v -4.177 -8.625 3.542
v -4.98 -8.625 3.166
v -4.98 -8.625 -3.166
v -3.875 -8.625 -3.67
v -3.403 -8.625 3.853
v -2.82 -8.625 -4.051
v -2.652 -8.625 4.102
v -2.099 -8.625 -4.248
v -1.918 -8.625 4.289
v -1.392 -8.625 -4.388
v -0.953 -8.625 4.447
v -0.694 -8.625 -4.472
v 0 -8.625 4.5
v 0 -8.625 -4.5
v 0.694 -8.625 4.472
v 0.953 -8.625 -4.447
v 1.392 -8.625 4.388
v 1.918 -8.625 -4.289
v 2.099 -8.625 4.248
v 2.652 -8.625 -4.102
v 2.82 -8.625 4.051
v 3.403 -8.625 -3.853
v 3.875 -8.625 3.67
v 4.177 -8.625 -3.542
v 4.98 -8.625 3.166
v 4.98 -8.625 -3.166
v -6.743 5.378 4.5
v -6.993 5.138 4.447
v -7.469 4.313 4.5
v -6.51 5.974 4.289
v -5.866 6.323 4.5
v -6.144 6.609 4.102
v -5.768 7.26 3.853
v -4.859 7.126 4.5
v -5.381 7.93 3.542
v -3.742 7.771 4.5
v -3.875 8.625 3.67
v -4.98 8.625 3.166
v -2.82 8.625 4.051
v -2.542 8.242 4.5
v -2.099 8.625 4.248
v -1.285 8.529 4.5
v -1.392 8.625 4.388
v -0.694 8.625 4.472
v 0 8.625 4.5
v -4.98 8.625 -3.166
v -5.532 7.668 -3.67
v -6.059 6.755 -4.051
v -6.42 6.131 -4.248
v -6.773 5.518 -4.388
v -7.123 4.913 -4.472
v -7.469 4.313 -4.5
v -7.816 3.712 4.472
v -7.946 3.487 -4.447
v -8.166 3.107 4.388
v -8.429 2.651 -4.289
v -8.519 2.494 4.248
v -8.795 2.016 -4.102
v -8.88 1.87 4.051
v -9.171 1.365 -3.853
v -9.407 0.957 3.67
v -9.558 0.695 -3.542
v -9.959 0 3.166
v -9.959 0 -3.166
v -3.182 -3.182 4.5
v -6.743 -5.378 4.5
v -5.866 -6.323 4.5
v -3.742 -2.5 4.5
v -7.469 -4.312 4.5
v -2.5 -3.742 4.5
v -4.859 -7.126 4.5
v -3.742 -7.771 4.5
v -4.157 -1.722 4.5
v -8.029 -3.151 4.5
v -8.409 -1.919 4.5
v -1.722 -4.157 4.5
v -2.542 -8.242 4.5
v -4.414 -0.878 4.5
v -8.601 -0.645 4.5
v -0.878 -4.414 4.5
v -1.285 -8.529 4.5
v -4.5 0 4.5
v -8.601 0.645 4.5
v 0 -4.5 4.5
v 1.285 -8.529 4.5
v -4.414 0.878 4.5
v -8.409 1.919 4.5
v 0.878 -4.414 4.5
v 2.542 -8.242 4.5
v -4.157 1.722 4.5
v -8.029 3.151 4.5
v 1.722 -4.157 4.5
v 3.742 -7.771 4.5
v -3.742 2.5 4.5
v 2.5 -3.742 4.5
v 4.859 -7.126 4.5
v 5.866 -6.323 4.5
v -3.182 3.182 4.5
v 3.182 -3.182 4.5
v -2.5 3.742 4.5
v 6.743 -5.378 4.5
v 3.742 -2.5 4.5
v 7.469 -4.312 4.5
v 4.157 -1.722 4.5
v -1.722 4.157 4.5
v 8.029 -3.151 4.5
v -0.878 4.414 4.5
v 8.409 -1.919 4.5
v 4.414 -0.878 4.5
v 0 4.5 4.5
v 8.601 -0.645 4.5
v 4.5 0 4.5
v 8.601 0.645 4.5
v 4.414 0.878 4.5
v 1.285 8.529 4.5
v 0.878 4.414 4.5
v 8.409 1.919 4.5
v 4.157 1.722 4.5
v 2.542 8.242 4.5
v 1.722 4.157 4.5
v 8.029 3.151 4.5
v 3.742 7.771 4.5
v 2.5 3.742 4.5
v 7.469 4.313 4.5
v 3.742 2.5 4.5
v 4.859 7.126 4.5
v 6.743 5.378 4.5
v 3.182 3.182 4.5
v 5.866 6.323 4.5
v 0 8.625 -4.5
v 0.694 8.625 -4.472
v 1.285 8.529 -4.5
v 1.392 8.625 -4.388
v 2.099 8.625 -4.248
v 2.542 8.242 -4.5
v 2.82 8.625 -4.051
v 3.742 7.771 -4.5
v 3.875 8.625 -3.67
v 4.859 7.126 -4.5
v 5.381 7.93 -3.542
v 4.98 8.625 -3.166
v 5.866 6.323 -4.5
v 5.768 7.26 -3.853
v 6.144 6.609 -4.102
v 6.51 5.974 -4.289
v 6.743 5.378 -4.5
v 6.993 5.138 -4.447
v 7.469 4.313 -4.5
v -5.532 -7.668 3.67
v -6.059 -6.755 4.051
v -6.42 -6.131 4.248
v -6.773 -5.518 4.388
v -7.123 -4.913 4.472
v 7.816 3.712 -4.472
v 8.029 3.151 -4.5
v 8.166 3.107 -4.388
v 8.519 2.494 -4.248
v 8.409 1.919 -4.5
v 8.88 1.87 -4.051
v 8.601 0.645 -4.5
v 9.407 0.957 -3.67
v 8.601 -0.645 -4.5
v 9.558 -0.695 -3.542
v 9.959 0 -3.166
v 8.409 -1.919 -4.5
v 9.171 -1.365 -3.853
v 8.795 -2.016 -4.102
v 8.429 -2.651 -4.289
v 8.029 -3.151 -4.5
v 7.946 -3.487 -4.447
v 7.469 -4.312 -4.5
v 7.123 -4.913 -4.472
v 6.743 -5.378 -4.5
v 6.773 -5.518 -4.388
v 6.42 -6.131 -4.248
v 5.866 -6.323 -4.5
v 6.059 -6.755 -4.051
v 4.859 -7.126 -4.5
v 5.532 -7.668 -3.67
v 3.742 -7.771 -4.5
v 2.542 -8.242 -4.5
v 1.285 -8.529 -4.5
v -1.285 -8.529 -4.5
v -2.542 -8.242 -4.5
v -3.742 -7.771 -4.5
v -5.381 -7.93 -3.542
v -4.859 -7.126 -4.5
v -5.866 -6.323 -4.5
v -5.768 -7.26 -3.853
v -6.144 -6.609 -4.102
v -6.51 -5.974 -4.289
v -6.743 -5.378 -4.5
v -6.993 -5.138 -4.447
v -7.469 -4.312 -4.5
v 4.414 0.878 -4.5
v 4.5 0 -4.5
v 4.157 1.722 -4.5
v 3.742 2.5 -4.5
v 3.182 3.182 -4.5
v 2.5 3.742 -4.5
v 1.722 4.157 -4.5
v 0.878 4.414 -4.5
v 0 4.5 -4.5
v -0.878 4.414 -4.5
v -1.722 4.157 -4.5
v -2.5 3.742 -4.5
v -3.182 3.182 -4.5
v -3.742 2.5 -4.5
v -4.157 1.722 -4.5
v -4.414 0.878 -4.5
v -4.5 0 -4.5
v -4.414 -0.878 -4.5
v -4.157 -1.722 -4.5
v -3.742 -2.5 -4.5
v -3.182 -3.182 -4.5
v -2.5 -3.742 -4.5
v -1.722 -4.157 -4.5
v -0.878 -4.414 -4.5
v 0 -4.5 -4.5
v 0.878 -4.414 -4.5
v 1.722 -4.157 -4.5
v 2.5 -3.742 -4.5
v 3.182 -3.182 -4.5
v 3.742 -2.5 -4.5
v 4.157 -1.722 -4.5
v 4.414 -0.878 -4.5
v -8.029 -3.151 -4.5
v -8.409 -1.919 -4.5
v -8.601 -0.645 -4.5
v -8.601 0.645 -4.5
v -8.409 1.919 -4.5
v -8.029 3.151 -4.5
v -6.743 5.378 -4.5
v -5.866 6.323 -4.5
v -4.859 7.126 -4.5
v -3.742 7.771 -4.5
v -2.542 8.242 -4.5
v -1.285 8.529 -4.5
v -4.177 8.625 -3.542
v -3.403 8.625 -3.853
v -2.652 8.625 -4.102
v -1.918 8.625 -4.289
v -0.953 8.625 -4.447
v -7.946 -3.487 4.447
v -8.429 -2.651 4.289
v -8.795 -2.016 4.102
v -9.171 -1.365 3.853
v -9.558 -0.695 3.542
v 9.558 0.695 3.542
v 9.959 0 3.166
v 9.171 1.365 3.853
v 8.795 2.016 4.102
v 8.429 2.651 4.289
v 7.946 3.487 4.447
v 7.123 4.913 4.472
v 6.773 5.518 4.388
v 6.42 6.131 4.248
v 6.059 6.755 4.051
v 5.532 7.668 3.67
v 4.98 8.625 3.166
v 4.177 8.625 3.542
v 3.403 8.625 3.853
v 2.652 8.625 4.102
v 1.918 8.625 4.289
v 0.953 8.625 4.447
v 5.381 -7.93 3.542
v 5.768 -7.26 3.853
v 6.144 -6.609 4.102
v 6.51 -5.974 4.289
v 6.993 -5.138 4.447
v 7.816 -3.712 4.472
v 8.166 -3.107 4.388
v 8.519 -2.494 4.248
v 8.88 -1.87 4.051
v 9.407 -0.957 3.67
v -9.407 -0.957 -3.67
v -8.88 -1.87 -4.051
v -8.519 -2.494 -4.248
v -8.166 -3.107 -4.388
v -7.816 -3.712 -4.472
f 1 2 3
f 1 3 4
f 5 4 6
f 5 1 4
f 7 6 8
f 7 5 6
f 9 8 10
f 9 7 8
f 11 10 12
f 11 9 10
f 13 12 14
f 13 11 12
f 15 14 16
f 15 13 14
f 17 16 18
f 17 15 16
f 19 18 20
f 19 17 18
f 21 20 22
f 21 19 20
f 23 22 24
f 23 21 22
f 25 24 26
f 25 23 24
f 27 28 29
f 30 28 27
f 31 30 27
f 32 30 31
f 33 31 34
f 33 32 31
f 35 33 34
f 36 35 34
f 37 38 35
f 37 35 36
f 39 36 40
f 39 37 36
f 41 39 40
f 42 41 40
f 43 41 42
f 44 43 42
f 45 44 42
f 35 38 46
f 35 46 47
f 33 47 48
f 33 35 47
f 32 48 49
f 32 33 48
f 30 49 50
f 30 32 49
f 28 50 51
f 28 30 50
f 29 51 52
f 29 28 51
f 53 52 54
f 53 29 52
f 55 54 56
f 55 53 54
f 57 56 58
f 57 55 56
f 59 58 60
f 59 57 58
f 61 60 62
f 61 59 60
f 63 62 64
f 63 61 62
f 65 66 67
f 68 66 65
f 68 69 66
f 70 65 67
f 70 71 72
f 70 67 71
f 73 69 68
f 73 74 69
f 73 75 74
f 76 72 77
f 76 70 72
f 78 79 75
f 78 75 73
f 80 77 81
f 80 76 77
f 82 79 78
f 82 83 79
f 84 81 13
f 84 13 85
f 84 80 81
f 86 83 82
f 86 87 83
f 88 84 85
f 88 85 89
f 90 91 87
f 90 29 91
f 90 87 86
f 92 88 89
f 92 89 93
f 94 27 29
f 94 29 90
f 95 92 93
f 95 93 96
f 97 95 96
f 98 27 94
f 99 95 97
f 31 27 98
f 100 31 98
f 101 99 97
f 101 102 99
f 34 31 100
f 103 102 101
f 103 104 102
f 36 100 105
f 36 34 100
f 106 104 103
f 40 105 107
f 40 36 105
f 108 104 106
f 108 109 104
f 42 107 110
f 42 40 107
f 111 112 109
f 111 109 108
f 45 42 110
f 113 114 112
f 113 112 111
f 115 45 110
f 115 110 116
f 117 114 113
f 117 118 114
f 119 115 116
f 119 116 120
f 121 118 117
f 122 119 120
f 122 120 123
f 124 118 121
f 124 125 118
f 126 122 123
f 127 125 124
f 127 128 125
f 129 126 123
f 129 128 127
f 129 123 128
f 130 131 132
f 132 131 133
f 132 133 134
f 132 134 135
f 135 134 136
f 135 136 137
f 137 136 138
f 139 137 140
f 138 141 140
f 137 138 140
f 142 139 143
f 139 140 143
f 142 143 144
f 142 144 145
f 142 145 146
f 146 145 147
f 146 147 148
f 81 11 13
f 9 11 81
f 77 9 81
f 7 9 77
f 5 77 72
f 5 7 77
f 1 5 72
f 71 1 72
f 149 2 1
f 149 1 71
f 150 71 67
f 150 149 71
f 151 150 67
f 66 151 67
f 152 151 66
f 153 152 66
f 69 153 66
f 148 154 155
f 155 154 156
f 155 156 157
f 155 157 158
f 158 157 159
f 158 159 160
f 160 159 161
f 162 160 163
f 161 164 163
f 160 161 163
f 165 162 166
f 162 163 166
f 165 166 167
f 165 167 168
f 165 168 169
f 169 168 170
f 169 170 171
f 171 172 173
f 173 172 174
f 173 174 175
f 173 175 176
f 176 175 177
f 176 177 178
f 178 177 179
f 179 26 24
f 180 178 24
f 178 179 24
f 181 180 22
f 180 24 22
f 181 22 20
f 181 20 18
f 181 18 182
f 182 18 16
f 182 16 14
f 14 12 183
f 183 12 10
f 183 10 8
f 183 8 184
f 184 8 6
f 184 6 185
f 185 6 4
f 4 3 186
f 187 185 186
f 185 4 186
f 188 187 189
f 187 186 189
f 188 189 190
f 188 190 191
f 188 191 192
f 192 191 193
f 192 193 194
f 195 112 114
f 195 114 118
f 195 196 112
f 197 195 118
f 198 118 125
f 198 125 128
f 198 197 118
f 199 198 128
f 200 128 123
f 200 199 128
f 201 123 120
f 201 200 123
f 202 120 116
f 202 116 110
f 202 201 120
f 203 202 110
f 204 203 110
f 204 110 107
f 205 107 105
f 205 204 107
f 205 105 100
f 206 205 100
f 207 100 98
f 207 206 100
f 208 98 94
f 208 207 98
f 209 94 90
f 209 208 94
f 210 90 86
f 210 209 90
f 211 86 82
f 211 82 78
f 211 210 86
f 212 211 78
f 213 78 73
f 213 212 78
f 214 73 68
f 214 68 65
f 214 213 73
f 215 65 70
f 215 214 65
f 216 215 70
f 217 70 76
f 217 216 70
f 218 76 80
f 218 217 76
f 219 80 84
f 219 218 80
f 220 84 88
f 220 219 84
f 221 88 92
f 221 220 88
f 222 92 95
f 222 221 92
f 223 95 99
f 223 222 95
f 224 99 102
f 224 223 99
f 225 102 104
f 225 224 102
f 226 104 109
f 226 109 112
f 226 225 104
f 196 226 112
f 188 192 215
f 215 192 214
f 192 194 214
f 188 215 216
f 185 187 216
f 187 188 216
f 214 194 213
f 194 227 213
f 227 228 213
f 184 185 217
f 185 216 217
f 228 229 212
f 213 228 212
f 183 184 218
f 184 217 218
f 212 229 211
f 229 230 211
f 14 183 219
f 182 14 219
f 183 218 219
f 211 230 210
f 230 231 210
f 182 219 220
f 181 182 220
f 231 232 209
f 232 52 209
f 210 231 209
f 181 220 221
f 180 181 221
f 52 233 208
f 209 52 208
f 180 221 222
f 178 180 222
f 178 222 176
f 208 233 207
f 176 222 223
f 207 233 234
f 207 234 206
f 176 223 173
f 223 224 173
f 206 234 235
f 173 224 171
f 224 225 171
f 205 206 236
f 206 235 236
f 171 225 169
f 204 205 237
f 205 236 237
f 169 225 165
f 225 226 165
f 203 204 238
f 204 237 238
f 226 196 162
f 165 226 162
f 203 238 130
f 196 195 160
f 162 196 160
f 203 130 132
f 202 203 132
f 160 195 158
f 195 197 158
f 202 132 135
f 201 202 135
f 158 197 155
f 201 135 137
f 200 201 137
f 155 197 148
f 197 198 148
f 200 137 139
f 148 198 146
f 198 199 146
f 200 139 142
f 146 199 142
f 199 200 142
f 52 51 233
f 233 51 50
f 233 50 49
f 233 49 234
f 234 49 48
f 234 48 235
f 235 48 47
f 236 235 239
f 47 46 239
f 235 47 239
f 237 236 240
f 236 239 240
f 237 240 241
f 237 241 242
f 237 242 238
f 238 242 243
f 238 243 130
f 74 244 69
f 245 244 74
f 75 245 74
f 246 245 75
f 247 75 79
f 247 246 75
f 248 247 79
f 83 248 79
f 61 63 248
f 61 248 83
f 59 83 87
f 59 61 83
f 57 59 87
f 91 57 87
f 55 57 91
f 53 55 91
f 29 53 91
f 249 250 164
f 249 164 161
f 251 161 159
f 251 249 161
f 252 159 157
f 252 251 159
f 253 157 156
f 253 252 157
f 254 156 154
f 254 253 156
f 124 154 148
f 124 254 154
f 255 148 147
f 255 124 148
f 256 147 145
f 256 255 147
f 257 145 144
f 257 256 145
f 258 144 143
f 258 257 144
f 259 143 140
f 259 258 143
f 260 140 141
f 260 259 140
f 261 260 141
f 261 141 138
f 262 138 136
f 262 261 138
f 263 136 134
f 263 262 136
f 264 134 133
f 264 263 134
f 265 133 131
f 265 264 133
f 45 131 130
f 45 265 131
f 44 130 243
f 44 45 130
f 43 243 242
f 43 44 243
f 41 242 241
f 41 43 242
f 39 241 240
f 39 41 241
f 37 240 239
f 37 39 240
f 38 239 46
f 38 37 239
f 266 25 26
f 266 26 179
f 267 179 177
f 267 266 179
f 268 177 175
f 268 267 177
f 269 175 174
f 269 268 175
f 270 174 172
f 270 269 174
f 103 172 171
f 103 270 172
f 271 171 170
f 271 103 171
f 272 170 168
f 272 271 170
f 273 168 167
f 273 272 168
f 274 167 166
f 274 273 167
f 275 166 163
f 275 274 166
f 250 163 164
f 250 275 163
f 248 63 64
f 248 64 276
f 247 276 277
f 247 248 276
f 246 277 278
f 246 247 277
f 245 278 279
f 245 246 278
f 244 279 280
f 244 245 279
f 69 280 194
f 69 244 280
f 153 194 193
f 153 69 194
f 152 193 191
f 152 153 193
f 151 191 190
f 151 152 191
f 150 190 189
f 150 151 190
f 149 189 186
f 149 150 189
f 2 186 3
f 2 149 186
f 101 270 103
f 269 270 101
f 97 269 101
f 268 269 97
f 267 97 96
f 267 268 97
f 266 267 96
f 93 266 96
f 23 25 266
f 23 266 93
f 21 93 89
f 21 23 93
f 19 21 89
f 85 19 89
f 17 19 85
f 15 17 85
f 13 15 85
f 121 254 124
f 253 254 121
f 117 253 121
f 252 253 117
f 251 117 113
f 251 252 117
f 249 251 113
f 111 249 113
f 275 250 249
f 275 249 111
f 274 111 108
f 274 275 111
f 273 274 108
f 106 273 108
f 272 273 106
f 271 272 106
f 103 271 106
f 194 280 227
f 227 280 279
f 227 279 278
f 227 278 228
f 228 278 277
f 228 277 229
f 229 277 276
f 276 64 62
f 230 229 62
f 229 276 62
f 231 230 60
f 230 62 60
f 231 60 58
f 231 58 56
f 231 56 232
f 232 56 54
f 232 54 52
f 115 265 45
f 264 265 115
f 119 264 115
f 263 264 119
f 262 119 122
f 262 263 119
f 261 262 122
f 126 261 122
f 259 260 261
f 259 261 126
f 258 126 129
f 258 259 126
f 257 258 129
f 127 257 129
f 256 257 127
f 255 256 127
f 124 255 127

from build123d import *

# Parameters (mm, degrees)
SKETCH4_R           = 4.5
BOSS_EXTRUDE2_DEPTH = 4.5
SKETCH5_OUTSIDE_W   = 45.486
SKETCH5_OUTSIDE_H   = 42.818
SKETCH5_OUTSIDE_R   = 8.625
CUT_EXTRUDE2_DEPTH  = 9
CUT_EXTRUDE2_TAPER  = 45


with BuildPart() as part:
    # Sketch4 → Boss-Extrude2 (new body, symmetric)
    with BuildSketch(Plane.XY):
        Polygon((9.959292144, 0), (4.979646072, 8.625), (-4.979646072, 8.625), (-9.959292144, 0), (-4.979646072, -8.625), (4.979646072, -8.625), align=None)
        Circle(SKETCH4_R, mode=Mode.SUBTRACT)
    extrude(amount=BOSS_EXTRUDE2_DEPTH, both=True)

    # Sketch5 outside → Cut-Extrude2 (cut)
    with BuildSketch(Plane.XY.offset(4.5)):
        Rectangle(SKETCH5_OUTSIDE_W, SKETCH5_OUTSIDE_H)
        Circle(SKETCH5_OUTSIDE_R, mode=Mode.SUBTRACT)
    cut_extrude2 = extrude(amount=-CUT_EXTRUDE2_DEPTH, taper=CUT_EXTRUDE2_TAPER, mode=Mode.SUBTRACT)

    # Mirror1: Cut-Extrude2 across plane
    add(cut_extrude2.mirror(Plane.XY), mode=Mode.SUBTRACT)


solid = part.part
